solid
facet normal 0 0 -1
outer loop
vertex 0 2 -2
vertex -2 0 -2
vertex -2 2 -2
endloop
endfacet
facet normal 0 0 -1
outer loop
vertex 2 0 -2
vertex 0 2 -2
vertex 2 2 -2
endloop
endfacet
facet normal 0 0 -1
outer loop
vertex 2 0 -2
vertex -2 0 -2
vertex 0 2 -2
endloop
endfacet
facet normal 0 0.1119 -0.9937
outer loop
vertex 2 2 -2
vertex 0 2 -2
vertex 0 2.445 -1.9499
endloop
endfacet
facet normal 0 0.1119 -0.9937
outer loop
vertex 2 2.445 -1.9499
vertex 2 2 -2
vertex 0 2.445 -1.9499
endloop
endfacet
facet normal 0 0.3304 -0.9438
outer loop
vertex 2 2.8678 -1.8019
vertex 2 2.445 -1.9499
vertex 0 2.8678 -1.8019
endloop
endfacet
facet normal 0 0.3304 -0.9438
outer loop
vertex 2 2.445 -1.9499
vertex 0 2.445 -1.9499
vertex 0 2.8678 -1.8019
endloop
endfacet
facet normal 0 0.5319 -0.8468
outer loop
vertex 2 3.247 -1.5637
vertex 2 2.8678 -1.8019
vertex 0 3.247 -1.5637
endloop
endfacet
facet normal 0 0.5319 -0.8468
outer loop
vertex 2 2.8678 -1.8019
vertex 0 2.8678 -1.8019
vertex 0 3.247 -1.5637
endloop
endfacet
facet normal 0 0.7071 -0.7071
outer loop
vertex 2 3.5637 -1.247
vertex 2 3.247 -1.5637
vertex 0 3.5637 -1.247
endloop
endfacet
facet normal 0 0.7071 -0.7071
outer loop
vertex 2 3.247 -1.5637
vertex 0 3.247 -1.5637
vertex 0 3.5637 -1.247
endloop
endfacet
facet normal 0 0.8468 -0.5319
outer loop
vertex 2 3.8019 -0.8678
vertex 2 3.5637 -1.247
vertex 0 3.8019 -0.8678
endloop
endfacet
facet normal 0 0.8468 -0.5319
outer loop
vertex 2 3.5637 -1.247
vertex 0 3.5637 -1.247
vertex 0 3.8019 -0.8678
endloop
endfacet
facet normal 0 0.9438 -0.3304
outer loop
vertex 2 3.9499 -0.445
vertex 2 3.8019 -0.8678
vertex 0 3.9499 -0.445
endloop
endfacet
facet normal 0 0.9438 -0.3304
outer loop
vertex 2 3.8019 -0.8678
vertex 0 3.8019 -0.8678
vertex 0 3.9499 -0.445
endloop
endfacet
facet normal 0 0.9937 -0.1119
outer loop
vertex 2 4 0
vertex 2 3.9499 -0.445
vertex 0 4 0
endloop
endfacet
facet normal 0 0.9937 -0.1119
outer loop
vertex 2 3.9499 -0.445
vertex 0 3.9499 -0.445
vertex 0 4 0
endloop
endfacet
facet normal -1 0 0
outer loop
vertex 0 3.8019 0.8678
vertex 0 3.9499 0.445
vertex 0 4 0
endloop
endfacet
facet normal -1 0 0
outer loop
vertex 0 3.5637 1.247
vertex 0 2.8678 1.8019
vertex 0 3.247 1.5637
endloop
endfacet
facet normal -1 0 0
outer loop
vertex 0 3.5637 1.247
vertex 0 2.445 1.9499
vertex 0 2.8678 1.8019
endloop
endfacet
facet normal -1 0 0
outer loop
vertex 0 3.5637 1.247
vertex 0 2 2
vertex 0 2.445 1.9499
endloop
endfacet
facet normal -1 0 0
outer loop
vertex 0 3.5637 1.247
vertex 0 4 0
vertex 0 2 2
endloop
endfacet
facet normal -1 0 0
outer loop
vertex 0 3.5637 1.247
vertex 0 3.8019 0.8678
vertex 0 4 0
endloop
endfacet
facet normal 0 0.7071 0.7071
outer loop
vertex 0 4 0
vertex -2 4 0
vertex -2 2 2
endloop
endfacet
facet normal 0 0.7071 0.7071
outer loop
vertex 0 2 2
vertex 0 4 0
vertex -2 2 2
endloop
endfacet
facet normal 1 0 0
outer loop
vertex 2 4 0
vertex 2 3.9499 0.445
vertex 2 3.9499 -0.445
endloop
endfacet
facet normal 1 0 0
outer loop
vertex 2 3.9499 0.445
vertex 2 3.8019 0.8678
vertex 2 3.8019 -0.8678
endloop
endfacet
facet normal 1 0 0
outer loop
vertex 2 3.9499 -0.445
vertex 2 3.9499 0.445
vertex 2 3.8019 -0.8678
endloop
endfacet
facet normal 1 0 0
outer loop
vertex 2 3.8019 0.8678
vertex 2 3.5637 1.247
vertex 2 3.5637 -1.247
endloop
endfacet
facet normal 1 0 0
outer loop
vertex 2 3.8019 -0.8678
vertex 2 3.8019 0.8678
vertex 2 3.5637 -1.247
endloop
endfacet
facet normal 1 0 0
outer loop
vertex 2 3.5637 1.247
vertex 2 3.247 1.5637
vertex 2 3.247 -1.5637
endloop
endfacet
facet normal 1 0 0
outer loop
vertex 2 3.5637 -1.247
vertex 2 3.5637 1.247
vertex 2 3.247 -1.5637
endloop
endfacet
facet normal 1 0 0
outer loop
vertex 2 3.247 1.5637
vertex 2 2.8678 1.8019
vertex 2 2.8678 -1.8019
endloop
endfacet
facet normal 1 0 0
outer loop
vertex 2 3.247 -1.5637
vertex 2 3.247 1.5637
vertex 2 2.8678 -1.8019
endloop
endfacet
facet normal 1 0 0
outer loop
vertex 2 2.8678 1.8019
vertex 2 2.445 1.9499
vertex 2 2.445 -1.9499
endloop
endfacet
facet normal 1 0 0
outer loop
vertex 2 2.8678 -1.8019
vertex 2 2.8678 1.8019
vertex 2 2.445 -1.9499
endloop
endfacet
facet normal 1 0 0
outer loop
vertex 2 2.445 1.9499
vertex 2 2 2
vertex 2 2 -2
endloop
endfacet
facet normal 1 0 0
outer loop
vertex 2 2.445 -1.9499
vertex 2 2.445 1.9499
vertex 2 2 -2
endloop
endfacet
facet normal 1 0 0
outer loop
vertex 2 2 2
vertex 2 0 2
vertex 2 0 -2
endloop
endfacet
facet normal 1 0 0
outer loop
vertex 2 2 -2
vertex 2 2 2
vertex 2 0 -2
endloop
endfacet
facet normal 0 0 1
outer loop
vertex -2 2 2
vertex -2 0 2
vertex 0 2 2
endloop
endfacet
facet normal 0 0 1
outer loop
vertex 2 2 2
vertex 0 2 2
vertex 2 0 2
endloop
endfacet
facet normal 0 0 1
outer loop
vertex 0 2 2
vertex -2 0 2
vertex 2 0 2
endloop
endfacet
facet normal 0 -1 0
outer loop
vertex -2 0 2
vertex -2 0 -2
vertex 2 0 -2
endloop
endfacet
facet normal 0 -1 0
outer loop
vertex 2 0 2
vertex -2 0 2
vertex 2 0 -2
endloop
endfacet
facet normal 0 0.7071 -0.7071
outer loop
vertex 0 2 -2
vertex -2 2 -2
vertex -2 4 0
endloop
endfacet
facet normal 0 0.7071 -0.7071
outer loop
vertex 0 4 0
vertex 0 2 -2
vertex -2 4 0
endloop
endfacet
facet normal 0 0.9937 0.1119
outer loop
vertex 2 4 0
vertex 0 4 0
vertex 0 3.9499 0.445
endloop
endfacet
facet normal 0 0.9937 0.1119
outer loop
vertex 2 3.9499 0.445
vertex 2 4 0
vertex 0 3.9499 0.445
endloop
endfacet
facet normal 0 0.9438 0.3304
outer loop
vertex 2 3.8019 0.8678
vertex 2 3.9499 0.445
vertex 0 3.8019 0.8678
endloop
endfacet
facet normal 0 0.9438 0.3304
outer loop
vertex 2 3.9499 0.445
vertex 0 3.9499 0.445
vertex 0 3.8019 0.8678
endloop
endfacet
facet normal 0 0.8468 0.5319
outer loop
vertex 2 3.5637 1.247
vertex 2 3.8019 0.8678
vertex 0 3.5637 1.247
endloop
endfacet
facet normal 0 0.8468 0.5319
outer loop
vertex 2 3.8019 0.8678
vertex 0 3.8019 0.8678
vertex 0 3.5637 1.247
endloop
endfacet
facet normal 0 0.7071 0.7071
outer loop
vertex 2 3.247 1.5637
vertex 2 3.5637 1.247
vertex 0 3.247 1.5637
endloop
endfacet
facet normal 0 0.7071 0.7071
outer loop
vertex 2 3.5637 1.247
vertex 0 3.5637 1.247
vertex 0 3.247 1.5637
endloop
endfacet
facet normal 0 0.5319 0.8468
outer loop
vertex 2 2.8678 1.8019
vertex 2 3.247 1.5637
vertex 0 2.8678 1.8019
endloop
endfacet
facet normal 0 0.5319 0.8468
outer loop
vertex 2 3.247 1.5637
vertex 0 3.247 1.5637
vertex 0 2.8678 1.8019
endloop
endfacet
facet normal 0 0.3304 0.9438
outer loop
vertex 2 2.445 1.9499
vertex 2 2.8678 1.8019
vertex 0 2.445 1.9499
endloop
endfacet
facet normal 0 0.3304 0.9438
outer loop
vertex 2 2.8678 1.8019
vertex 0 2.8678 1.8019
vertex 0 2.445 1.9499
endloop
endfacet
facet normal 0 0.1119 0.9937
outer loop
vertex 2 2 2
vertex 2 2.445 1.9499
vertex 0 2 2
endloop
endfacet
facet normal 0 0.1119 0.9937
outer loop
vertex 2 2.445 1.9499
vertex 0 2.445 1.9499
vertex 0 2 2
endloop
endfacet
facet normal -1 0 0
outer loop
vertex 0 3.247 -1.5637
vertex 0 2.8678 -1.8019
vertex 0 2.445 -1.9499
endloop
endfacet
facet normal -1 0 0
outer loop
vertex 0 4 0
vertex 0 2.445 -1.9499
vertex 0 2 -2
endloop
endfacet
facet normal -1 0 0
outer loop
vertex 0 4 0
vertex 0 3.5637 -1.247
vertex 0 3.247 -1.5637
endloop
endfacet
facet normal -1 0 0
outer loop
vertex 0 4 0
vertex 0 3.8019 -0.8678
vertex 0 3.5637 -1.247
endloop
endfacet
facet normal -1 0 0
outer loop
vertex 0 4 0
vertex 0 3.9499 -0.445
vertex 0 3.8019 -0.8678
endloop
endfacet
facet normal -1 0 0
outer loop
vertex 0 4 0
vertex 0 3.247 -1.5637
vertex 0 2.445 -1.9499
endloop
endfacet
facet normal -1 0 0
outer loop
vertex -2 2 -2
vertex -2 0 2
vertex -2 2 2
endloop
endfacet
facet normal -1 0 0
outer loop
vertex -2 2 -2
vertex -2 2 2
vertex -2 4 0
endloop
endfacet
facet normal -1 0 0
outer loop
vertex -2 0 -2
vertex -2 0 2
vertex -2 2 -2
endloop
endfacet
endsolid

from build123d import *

# Parameters (mm, degrees)
SKETCH1_W           = 4
SKETCH1_H           = 4
BOSS_EXTRUDE1_DEPTH = 4
CUT_EXTRUDE1_DEPTH  = 2
CUT_EXTRUDE2_DEPTH  = 10


with BuildPart() as part:
    # Sketch1 → Boss-Extrude1 (new body)
    with BuildSketch(Plane(origin=(0, 0, 0), x_dir=(1, 0, 0), z_dir=(0, 1, 0))):
        Rectangle(SKETCH1_W, SKETCH1_H)
    extrude(amount=BOSS_EXTRUDE1_DEPTH)

    # Sketch2 → Cut-Extrude1 (cut)
    with BuildSketch(Plane.ZY.offset(2)):
        Polygon((-2, 2), (0, 4), (-2, 4), align=None)
        Polygon((0, 4), (2, 2), (2, 4), align=None)
    extrude(amount=-CUT_EXTRUDE1_DEPTH, mode=Mode.SUBTRACT)

    # Sketch3 → Cut-Extrude2 (cut)
    with BuildSketch(Plane.ZY):
        with BuildLine():
            ThreePointArc((-2, 2), (-1.414213562, 3.414213562), (0, 4))
            Line((0, 4), (-2, 4))
            Line((-2, 4), (-2, 2))
        make_face()
        with BuildLine():
            Line((2, 4), (0, 4))
            ThreePointArc((0, 4), (1.414213562, 3.414213562), (2, 2))
            Line((2, 2), (2, 4))
        make_face()
    extrude(amount=-CUT_EXTRUDE2_DEPTH, mode=Mode.SUBTRACT)


solid = part.part
